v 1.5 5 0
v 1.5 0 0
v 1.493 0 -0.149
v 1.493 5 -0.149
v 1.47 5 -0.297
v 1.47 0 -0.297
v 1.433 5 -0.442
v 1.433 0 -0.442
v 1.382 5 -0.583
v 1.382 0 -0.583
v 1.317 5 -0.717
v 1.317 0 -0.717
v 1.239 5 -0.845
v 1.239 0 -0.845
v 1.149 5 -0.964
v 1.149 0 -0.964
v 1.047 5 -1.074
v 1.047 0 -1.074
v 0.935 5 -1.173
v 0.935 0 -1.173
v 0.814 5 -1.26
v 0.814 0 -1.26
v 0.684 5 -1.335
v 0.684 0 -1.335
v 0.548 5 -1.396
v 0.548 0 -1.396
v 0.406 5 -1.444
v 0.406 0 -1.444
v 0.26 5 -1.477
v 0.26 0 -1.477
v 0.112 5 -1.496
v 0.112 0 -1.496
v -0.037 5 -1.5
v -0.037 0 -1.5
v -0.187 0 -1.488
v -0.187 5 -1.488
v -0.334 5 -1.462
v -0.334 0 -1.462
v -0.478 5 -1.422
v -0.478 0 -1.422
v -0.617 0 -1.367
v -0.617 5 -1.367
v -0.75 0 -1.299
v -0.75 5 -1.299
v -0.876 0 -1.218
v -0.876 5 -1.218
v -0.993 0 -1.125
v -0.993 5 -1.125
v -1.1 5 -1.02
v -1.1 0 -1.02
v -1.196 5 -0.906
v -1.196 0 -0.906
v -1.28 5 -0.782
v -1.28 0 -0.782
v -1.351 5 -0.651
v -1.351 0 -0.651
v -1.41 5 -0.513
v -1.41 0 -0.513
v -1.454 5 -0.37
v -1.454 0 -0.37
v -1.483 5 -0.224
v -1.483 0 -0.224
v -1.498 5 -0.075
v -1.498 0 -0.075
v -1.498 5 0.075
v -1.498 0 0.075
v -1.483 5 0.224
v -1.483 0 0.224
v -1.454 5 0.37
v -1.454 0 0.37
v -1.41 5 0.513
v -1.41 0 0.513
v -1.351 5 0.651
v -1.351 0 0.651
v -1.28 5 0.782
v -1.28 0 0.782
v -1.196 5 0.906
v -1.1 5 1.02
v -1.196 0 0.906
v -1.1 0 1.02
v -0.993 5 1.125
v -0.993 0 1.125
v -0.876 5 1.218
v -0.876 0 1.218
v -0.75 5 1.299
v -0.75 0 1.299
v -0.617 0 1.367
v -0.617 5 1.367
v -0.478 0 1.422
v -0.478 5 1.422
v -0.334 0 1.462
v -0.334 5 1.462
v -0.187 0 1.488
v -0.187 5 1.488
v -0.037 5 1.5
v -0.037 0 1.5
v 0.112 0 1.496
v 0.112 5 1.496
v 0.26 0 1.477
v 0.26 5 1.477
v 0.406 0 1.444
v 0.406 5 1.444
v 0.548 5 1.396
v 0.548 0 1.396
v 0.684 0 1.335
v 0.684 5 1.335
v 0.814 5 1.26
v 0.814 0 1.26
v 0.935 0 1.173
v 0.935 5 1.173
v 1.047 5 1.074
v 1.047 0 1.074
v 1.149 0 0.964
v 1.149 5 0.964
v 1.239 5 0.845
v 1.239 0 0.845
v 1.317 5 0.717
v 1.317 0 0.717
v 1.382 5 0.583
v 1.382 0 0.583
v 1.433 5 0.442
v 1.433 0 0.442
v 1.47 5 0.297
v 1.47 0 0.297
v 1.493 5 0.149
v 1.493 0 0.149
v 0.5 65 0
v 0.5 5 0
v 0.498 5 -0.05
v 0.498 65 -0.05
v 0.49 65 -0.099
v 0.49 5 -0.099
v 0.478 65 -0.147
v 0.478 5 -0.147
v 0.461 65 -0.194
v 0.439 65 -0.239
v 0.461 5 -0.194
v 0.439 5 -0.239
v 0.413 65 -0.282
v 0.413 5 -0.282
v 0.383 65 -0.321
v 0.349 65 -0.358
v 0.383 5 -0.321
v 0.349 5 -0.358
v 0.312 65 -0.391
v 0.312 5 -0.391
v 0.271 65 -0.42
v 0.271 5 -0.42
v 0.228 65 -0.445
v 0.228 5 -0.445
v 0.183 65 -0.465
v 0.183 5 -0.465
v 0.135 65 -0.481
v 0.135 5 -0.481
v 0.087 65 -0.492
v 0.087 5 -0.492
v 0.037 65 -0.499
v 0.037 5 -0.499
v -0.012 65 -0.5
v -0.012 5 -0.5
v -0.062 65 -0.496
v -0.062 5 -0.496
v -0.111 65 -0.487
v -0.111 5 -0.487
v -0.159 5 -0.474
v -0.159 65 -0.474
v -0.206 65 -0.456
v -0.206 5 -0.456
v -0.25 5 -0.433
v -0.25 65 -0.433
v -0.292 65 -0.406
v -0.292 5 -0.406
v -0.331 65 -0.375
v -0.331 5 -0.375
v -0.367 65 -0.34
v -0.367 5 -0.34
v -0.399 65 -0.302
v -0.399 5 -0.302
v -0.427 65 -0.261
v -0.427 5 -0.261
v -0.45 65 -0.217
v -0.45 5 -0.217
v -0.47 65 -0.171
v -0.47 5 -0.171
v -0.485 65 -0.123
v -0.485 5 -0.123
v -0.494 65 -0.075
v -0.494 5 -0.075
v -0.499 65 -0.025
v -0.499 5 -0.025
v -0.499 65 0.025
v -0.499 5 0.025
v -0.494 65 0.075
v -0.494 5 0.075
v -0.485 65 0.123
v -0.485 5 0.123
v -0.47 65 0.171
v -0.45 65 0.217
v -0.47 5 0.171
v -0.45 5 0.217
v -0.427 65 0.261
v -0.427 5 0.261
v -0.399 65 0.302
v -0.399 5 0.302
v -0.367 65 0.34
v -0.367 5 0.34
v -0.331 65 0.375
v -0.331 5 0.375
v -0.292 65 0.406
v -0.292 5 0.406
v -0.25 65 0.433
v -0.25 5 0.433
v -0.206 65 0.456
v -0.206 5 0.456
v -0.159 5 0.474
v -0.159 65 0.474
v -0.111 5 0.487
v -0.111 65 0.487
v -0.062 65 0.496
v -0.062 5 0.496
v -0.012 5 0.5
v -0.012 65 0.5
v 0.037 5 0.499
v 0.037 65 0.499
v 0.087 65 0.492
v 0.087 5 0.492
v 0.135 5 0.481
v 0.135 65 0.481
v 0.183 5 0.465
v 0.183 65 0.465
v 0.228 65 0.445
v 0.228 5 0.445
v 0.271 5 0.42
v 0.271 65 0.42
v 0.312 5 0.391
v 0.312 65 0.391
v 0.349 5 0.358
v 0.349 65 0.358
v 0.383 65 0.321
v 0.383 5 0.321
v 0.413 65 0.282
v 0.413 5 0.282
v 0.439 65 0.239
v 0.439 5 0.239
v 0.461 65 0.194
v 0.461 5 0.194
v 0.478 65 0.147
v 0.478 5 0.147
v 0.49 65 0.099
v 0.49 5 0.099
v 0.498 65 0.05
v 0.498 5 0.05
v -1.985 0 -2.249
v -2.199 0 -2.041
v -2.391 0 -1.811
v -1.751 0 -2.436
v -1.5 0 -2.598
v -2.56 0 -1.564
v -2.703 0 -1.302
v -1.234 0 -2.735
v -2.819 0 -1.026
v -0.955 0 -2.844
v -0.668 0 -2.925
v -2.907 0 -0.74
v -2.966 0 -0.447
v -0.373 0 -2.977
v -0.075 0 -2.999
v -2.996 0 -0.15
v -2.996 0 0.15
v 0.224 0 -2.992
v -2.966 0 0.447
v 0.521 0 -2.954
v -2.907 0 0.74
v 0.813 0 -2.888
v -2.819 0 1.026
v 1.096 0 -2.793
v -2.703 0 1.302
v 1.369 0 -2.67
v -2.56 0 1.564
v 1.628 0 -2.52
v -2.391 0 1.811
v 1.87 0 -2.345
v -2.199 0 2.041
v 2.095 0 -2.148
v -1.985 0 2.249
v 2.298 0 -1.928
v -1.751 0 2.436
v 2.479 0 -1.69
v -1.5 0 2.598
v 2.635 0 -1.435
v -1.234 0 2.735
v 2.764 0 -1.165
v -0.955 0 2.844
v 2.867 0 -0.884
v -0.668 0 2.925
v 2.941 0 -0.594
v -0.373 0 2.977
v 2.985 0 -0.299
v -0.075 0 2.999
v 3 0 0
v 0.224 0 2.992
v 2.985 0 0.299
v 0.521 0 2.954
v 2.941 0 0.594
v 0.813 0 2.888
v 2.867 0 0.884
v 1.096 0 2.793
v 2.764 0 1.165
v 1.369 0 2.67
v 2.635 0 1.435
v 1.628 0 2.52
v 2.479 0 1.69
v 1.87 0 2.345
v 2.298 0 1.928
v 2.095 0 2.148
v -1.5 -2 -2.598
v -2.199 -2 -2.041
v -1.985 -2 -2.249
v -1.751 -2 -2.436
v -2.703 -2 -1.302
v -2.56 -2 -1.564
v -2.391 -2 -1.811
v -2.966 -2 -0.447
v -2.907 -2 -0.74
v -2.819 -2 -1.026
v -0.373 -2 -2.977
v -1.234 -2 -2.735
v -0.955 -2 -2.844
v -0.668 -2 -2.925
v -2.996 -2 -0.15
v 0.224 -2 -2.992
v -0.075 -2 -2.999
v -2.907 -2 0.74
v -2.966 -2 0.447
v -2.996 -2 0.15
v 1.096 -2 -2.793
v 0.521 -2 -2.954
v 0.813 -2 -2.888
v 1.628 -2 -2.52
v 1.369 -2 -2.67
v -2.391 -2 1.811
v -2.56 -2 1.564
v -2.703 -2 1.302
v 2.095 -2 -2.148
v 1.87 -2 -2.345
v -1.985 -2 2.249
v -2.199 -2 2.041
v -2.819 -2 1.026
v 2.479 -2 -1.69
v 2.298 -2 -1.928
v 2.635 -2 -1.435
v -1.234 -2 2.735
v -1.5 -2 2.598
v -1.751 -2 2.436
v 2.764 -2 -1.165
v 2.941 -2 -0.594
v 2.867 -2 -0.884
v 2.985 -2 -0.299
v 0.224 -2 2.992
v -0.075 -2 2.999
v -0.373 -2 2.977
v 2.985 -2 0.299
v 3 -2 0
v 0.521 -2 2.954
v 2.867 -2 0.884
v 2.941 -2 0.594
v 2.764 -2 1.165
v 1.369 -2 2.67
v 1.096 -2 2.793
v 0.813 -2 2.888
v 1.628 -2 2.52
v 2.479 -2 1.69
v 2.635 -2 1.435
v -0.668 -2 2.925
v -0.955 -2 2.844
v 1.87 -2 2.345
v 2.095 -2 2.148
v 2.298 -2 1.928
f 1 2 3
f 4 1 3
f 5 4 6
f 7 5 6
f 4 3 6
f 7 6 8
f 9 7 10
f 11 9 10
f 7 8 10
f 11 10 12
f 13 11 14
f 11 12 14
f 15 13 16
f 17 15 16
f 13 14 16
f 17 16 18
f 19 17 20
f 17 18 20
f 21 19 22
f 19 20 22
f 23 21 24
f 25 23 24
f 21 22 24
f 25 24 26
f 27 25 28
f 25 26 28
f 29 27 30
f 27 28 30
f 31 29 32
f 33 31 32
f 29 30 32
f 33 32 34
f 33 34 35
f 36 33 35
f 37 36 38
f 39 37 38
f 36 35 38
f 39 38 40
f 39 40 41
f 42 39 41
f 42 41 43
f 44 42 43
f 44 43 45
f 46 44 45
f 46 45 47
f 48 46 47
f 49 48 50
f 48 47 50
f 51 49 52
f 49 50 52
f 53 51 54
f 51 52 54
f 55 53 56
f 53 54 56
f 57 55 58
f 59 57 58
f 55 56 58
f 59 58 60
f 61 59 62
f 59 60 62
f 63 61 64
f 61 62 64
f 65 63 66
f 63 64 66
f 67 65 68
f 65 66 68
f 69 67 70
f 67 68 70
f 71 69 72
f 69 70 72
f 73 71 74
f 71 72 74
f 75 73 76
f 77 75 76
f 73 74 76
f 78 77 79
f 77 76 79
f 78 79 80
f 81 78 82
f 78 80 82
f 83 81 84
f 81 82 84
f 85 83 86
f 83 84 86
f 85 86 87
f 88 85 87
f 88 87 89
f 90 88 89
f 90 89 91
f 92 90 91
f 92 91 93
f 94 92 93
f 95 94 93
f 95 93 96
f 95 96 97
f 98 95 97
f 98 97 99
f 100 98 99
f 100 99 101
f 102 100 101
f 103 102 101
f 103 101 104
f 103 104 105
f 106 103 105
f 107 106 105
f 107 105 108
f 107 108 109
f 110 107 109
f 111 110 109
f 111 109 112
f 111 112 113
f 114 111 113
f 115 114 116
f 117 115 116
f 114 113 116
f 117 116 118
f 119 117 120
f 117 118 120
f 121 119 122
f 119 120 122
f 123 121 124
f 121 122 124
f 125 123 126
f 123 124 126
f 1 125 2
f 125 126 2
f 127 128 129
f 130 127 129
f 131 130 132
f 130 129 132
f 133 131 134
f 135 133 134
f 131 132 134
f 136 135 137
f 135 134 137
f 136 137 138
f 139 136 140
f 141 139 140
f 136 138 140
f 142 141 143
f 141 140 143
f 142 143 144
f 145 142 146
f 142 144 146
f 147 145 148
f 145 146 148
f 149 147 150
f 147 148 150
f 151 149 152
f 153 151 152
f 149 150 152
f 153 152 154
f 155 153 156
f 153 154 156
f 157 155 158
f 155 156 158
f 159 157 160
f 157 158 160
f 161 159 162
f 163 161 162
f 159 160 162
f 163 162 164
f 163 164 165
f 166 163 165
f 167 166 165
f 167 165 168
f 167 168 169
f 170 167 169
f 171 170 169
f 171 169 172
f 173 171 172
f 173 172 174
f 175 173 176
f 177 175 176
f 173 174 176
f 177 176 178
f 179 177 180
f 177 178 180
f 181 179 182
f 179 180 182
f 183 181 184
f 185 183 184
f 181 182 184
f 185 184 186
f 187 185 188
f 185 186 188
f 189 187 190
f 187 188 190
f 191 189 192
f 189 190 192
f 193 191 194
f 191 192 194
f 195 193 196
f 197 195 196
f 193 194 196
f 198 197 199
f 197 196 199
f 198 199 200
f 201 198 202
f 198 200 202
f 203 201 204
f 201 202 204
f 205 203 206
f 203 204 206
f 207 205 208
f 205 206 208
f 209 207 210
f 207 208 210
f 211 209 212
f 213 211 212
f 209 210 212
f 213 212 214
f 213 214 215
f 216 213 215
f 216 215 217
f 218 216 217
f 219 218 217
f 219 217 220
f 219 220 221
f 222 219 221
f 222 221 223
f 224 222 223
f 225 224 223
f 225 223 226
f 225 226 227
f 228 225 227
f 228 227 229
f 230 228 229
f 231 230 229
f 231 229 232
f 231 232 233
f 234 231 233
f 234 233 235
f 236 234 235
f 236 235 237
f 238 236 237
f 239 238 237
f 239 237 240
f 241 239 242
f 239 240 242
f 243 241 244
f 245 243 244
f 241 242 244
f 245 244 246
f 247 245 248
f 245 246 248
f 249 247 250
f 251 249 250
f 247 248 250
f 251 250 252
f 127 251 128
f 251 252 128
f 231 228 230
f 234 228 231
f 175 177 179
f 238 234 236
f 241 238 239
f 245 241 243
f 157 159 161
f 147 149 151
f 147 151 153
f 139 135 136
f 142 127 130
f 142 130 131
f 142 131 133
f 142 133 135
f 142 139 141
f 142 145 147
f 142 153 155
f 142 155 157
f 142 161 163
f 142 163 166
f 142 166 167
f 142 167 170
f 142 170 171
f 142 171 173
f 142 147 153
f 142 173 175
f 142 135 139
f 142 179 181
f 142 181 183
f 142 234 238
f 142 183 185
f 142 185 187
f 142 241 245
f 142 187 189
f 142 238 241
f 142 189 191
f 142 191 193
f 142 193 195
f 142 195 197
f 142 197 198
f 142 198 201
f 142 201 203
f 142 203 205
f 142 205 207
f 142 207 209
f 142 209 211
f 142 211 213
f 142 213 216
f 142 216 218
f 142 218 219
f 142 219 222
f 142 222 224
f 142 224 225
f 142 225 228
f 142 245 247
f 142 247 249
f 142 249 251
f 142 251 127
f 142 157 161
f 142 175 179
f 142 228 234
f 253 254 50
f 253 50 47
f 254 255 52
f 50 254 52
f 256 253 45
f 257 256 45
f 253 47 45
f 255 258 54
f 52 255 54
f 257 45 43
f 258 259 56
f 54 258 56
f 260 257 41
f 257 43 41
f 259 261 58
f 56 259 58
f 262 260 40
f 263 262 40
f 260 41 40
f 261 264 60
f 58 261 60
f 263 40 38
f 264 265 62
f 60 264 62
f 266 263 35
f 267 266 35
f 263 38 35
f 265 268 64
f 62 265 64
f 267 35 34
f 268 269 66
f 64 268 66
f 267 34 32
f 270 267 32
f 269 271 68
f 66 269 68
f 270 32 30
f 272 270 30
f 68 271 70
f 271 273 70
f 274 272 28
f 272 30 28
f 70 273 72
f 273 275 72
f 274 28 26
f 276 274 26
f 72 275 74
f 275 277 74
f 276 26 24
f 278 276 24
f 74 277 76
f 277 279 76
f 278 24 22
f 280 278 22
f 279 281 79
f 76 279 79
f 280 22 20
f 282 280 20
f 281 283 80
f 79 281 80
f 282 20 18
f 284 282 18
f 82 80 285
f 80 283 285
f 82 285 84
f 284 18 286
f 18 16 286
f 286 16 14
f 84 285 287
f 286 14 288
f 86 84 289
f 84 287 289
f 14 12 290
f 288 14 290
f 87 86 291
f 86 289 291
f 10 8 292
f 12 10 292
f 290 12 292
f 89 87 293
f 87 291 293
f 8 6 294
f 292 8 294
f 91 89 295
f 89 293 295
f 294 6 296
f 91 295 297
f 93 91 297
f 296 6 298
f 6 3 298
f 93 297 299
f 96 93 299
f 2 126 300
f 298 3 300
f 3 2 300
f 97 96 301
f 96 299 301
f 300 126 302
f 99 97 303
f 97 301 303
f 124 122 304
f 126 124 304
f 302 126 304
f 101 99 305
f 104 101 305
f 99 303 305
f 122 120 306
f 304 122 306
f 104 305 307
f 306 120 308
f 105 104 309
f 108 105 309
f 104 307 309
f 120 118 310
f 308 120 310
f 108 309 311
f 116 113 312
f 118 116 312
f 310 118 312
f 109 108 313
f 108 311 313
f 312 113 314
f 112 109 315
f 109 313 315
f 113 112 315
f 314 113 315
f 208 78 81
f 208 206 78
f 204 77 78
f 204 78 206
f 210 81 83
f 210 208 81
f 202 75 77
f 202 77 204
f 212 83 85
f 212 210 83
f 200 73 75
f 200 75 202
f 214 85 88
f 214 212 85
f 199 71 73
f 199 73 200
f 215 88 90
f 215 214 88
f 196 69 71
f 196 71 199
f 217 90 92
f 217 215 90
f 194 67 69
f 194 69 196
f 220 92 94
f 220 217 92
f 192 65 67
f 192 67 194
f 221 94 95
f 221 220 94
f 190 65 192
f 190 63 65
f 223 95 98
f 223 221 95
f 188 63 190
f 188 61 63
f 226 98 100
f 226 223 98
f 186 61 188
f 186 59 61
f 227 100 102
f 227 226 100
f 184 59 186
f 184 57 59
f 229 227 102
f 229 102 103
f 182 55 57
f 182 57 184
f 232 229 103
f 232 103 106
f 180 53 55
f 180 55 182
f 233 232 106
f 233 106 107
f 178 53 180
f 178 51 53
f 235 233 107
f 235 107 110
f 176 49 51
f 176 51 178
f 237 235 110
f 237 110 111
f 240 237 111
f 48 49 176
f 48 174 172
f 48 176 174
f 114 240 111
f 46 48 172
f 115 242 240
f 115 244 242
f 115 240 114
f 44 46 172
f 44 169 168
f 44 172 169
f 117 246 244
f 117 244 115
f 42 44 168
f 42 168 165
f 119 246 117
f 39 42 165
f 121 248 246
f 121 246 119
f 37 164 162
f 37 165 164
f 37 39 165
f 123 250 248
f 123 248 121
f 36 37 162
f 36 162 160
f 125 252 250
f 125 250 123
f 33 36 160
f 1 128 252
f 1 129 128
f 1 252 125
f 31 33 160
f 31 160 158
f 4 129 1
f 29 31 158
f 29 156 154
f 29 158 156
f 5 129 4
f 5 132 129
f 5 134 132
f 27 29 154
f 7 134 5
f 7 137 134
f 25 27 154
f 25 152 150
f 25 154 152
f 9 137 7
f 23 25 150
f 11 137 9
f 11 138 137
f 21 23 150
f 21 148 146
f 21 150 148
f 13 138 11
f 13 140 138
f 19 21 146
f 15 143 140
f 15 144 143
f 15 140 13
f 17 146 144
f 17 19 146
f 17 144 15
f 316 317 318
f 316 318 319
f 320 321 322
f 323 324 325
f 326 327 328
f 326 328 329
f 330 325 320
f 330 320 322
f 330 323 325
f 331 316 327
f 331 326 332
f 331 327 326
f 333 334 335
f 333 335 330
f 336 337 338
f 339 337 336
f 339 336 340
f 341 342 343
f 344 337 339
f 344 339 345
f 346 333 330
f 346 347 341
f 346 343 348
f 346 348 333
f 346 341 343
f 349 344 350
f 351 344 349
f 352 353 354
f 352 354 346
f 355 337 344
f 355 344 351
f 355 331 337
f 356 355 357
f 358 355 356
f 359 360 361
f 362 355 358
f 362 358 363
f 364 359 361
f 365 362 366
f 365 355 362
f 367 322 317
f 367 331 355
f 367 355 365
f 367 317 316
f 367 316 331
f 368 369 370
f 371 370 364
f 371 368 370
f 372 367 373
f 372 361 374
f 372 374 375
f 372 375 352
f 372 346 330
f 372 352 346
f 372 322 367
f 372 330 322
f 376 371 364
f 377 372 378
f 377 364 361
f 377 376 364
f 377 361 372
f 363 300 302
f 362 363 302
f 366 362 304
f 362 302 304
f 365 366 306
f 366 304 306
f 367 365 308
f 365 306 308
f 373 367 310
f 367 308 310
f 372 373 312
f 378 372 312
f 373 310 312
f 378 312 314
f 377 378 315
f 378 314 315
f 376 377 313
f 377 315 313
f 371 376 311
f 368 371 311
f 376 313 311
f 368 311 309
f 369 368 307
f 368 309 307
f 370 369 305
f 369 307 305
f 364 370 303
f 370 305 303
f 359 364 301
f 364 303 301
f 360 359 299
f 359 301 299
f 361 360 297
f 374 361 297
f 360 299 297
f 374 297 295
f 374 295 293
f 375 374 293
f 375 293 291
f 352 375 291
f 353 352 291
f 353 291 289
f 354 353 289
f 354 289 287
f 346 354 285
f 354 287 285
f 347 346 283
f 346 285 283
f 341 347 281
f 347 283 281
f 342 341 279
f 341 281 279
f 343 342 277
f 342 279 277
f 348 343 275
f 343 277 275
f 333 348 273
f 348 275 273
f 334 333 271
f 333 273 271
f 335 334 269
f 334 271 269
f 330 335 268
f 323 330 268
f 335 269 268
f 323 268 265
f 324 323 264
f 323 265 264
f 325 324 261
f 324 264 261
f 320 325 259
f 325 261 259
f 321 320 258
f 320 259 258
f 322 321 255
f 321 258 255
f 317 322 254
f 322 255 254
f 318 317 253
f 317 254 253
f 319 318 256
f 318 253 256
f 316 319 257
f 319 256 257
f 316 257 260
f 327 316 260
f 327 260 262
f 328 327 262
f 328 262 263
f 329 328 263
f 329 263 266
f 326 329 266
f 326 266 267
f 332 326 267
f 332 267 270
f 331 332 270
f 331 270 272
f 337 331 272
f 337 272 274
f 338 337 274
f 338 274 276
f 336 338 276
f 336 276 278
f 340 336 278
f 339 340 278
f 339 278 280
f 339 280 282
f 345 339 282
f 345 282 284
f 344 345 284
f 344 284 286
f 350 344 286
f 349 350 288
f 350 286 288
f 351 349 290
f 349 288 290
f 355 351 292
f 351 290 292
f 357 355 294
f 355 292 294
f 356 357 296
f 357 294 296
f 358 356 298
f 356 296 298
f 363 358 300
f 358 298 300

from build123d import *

# Parameters (mm, degrees)
SKETCH2_R           = 1.5
BOSS_EXTRUDE1_DEPTH = 5
SKETCH3_R           = 0.5
BOSS_EXTRUDE2_DEPTH = 60
SKETCH4_R           = 3
BOSS_EXTRUDE3_DEPTH = 2


with BuildPart() as part:
    # Sketch2 → Boss-Extrude1 (new body)
    with BuildSketch(Plane(origin=(0, 0, 0), x_dir=(1, 0, 0), z_dir=(0, 1, 0))):
        Circle(SKETCH2_R)
    extrude(amount=BOSS_EXTRUDE1_DEPTH)

    # Sketch3 → Boss-Extrude2 (add)
    with BuildSketch(Plane(origin=(0, 5, 0), x_dir=(1, 0, 0), z_dir=(0, 1, 0))):
        Circle(SKETCH3_R)
    extrude(amount=BOSS_EXTRUDE2_DEPTH)

    # Sketch4 → Boss-Extrude3 (add)
    with BuildSketch(Plane.XZ):
        Circle(SKETCH4_R)
    extrude(amount=BOSS_EXTRUDE3_DEPTH)


solid = part.part
